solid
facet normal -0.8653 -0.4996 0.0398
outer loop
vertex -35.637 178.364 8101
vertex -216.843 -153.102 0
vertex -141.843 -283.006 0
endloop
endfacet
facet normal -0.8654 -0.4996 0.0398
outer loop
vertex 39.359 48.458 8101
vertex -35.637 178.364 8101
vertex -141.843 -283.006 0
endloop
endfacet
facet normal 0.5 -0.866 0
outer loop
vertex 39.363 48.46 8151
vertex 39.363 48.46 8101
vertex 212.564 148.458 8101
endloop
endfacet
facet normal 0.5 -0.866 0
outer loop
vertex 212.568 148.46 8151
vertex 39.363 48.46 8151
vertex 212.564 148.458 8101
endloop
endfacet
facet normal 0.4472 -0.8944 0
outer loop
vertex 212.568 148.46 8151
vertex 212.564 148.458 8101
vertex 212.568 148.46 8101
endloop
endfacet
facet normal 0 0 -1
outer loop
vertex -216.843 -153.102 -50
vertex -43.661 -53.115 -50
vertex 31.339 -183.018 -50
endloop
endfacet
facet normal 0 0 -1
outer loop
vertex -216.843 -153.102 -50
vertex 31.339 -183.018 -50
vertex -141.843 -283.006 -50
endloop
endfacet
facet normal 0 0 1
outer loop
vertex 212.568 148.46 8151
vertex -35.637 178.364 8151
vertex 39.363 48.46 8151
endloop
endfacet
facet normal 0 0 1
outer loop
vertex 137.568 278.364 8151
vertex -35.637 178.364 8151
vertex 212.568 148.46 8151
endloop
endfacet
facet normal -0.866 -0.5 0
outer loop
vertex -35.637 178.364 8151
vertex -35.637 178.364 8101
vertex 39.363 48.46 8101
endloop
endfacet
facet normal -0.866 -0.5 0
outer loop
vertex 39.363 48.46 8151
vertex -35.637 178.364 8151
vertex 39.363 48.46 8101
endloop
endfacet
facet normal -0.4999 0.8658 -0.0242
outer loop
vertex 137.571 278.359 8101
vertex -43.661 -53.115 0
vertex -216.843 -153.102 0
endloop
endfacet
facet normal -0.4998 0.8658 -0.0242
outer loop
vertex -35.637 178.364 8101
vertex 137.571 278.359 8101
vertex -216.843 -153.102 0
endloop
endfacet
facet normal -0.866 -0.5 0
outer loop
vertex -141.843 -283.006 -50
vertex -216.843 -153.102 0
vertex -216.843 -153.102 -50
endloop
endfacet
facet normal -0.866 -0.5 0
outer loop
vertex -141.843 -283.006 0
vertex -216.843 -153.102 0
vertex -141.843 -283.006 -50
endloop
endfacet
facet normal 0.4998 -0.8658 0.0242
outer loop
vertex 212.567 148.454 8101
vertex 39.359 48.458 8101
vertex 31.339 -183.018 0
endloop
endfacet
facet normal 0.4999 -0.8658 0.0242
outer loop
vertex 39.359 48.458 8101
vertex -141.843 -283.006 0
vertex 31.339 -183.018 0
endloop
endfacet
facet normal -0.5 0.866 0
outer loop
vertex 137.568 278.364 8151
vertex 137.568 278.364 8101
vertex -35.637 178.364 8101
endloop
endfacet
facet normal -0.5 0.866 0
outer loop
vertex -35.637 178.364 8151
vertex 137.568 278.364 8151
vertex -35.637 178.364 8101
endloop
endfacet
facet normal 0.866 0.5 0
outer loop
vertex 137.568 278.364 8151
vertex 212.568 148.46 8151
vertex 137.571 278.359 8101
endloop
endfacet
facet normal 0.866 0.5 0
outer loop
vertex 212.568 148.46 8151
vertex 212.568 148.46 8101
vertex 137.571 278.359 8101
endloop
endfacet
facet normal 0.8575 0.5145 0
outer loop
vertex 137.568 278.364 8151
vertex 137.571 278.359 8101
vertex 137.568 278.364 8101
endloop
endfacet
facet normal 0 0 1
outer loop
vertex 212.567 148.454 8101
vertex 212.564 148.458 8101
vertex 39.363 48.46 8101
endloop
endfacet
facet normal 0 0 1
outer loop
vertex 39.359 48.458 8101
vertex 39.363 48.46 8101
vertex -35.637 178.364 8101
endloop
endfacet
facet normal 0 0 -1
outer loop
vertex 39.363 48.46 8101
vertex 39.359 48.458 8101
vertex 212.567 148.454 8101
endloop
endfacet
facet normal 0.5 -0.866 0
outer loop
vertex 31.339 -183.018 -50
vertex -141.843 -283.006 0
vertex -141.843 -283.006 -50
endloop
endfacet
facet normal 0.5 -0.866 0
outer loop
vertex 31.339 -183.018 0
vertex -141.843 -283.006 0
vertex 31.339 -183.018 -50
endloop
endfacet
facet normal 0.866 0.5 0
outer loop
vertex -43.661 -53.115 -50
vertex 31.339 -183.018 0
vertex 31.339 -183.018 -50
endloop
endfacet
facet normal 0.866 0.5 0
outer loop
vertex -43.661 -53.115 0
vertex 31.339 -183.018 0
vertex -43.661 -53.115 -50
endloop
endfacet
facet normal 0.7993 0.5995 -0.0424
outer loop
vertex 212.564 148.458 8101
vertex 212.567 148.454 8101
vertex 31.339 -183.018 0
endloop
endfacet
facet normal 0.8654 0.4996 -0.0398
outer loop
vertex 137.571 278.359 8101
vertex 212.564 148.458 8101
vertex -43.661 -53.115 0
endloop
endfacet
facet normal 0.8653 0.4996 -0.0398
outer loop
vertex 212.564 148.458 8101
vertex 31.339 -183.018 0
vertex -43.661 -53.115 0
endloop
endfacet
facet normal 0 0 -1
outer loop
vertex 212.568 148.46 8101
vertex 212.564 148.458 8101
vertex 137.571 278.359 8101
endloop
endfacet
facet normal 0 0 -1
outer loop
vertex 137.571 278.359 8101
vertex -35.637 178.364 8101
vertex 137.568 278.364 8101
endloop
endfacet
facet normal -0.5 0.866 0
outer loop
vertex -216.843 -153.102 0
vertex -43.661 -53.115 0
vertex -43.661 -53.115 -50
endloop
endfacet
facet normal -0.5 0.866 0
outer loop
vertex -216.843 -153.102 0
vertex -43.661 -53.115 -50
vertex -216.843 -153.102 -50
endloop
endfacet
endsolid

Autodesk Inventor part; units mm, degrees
ref_plane "YZ Plane" through (0, 0, 0) normal (1, 0, 0) x (0, 1, 0)
ref_plane "XZ Plane" through (0, 0, 0) normal (0, 1, 0) x (-1, 0, 0)
sketch "Sketch1" plane through (0, 0, 0) normal (0, 0, 1) x (1, 0, 0)
  line L0 (-43.6494, -53.1082) -> (-216.8545, -153.1082)
  line L1 (-216.8657, -153.1146) -> (-141.8657, -283.0184)
  line L2 (31.3394, -183.0184) -> (-43.6606, -53.1146)
  line L3 (-141.8545, -283.012) -> (31.3506, -183.012)
  line L4 (-141.8433, -283.0055) -> (31.3394, -183.0184)
  line L5 (31.3394, -183.0184) -> (-43.6606, -53.1146)
  line L6 (-43.6606, -53.1146) -> (-216.8433, -153.1017)
  line L7 (-216.8433, -153.1017) -> (-141.8433, -283.0055)
  line L8 (-141.8433, -283.0055) -> (-43.6606, -53.1146) construction
  line L9 (31.3394, -183.0184) -> (-216.8433, -153.1017) construction
  point P0 (-92.7519, -168.0601)
ref_plane "Work Plane2" through (0, 0, 8101) normal (0, 0, 1) x (1, 0, 0)
ref_plane "Work Plane1" through (0, 0, 0) normal (0, 0, 1) x (1, 0, 0)
sketch "Sketch2" plane through (0, 0, 8101) normal (0, 0, 1) x (1, 0, 0)
  line L0 (137.5706, 278.3594) -> (-35.6372, 178.364) projected
  line L1 (212.5671, 148.4536) -> (137.5706, 278.3594) projected
  line L2 (39.3594, 48.4582) -> (212.5671, 148.4536) projected
  line L3 (-35.6372, 178.364) -> (39.3594, 48.4582) projected
  line L4 (212.5671, 148.4536) -> (39.3594, 48.4582)
  line L5 (39.3594, 48.4582) -> (-35.6372, 178.364)
  line L6 (-35.6372, 178.364) -> (137.5706, 278.3594)
  line L7 (137.5706, 278.3594) -> (212.5671, 148.4536)
  line L8 (212.5671, 148.4536) -> (-35.6372, 178.364) construction
  line L9 (39.3594, 48.4582) -> (137.5706, 278.3594) construction
  point P0 (0, 0)
  point P1 (88.465, 163.4088)
loft "Loft1" add profiles "Sketch2", "Sketch1"
sketch "Sketch3" plane through (-43.6606, -53.1146, 0) normal (0, 0, -1) x (-0.866, -0.5, 0)
  line L0 (0, 0) -> (199.9742, 0) projected
  line L1 (0, -150) -> (0, 0) projected
  line L2 (199.9742, -150) -> (0, -150) projected
  line L3 (199.9742, 0) -> (199.9742, -150) projected
  point P0 (-64.3685, 24.1683)
sketch "Sketch4" plane through (-35.6372, 178.364, 8101) normal (0, 0, 1) x (0.866, 0.5, 0)
  line L0 (200, 0) -> (0, 0) projected
  line L1 (0, 0) -> (0, -150) projected
  line L2 (0, -150) -> (200, -150) projected
  line L3 (200, -150) -> (200, 0) projected
  point P0 (-58.3147, -172.2879)
extrude "Extrusion1" add sketch "Sketch3" along normal blind 50
extrude "Extrusion2" add sketch "Sketch4" along normal blind 50
properties part number "support_beam_segment_0105" material "Wood (Maple)"
